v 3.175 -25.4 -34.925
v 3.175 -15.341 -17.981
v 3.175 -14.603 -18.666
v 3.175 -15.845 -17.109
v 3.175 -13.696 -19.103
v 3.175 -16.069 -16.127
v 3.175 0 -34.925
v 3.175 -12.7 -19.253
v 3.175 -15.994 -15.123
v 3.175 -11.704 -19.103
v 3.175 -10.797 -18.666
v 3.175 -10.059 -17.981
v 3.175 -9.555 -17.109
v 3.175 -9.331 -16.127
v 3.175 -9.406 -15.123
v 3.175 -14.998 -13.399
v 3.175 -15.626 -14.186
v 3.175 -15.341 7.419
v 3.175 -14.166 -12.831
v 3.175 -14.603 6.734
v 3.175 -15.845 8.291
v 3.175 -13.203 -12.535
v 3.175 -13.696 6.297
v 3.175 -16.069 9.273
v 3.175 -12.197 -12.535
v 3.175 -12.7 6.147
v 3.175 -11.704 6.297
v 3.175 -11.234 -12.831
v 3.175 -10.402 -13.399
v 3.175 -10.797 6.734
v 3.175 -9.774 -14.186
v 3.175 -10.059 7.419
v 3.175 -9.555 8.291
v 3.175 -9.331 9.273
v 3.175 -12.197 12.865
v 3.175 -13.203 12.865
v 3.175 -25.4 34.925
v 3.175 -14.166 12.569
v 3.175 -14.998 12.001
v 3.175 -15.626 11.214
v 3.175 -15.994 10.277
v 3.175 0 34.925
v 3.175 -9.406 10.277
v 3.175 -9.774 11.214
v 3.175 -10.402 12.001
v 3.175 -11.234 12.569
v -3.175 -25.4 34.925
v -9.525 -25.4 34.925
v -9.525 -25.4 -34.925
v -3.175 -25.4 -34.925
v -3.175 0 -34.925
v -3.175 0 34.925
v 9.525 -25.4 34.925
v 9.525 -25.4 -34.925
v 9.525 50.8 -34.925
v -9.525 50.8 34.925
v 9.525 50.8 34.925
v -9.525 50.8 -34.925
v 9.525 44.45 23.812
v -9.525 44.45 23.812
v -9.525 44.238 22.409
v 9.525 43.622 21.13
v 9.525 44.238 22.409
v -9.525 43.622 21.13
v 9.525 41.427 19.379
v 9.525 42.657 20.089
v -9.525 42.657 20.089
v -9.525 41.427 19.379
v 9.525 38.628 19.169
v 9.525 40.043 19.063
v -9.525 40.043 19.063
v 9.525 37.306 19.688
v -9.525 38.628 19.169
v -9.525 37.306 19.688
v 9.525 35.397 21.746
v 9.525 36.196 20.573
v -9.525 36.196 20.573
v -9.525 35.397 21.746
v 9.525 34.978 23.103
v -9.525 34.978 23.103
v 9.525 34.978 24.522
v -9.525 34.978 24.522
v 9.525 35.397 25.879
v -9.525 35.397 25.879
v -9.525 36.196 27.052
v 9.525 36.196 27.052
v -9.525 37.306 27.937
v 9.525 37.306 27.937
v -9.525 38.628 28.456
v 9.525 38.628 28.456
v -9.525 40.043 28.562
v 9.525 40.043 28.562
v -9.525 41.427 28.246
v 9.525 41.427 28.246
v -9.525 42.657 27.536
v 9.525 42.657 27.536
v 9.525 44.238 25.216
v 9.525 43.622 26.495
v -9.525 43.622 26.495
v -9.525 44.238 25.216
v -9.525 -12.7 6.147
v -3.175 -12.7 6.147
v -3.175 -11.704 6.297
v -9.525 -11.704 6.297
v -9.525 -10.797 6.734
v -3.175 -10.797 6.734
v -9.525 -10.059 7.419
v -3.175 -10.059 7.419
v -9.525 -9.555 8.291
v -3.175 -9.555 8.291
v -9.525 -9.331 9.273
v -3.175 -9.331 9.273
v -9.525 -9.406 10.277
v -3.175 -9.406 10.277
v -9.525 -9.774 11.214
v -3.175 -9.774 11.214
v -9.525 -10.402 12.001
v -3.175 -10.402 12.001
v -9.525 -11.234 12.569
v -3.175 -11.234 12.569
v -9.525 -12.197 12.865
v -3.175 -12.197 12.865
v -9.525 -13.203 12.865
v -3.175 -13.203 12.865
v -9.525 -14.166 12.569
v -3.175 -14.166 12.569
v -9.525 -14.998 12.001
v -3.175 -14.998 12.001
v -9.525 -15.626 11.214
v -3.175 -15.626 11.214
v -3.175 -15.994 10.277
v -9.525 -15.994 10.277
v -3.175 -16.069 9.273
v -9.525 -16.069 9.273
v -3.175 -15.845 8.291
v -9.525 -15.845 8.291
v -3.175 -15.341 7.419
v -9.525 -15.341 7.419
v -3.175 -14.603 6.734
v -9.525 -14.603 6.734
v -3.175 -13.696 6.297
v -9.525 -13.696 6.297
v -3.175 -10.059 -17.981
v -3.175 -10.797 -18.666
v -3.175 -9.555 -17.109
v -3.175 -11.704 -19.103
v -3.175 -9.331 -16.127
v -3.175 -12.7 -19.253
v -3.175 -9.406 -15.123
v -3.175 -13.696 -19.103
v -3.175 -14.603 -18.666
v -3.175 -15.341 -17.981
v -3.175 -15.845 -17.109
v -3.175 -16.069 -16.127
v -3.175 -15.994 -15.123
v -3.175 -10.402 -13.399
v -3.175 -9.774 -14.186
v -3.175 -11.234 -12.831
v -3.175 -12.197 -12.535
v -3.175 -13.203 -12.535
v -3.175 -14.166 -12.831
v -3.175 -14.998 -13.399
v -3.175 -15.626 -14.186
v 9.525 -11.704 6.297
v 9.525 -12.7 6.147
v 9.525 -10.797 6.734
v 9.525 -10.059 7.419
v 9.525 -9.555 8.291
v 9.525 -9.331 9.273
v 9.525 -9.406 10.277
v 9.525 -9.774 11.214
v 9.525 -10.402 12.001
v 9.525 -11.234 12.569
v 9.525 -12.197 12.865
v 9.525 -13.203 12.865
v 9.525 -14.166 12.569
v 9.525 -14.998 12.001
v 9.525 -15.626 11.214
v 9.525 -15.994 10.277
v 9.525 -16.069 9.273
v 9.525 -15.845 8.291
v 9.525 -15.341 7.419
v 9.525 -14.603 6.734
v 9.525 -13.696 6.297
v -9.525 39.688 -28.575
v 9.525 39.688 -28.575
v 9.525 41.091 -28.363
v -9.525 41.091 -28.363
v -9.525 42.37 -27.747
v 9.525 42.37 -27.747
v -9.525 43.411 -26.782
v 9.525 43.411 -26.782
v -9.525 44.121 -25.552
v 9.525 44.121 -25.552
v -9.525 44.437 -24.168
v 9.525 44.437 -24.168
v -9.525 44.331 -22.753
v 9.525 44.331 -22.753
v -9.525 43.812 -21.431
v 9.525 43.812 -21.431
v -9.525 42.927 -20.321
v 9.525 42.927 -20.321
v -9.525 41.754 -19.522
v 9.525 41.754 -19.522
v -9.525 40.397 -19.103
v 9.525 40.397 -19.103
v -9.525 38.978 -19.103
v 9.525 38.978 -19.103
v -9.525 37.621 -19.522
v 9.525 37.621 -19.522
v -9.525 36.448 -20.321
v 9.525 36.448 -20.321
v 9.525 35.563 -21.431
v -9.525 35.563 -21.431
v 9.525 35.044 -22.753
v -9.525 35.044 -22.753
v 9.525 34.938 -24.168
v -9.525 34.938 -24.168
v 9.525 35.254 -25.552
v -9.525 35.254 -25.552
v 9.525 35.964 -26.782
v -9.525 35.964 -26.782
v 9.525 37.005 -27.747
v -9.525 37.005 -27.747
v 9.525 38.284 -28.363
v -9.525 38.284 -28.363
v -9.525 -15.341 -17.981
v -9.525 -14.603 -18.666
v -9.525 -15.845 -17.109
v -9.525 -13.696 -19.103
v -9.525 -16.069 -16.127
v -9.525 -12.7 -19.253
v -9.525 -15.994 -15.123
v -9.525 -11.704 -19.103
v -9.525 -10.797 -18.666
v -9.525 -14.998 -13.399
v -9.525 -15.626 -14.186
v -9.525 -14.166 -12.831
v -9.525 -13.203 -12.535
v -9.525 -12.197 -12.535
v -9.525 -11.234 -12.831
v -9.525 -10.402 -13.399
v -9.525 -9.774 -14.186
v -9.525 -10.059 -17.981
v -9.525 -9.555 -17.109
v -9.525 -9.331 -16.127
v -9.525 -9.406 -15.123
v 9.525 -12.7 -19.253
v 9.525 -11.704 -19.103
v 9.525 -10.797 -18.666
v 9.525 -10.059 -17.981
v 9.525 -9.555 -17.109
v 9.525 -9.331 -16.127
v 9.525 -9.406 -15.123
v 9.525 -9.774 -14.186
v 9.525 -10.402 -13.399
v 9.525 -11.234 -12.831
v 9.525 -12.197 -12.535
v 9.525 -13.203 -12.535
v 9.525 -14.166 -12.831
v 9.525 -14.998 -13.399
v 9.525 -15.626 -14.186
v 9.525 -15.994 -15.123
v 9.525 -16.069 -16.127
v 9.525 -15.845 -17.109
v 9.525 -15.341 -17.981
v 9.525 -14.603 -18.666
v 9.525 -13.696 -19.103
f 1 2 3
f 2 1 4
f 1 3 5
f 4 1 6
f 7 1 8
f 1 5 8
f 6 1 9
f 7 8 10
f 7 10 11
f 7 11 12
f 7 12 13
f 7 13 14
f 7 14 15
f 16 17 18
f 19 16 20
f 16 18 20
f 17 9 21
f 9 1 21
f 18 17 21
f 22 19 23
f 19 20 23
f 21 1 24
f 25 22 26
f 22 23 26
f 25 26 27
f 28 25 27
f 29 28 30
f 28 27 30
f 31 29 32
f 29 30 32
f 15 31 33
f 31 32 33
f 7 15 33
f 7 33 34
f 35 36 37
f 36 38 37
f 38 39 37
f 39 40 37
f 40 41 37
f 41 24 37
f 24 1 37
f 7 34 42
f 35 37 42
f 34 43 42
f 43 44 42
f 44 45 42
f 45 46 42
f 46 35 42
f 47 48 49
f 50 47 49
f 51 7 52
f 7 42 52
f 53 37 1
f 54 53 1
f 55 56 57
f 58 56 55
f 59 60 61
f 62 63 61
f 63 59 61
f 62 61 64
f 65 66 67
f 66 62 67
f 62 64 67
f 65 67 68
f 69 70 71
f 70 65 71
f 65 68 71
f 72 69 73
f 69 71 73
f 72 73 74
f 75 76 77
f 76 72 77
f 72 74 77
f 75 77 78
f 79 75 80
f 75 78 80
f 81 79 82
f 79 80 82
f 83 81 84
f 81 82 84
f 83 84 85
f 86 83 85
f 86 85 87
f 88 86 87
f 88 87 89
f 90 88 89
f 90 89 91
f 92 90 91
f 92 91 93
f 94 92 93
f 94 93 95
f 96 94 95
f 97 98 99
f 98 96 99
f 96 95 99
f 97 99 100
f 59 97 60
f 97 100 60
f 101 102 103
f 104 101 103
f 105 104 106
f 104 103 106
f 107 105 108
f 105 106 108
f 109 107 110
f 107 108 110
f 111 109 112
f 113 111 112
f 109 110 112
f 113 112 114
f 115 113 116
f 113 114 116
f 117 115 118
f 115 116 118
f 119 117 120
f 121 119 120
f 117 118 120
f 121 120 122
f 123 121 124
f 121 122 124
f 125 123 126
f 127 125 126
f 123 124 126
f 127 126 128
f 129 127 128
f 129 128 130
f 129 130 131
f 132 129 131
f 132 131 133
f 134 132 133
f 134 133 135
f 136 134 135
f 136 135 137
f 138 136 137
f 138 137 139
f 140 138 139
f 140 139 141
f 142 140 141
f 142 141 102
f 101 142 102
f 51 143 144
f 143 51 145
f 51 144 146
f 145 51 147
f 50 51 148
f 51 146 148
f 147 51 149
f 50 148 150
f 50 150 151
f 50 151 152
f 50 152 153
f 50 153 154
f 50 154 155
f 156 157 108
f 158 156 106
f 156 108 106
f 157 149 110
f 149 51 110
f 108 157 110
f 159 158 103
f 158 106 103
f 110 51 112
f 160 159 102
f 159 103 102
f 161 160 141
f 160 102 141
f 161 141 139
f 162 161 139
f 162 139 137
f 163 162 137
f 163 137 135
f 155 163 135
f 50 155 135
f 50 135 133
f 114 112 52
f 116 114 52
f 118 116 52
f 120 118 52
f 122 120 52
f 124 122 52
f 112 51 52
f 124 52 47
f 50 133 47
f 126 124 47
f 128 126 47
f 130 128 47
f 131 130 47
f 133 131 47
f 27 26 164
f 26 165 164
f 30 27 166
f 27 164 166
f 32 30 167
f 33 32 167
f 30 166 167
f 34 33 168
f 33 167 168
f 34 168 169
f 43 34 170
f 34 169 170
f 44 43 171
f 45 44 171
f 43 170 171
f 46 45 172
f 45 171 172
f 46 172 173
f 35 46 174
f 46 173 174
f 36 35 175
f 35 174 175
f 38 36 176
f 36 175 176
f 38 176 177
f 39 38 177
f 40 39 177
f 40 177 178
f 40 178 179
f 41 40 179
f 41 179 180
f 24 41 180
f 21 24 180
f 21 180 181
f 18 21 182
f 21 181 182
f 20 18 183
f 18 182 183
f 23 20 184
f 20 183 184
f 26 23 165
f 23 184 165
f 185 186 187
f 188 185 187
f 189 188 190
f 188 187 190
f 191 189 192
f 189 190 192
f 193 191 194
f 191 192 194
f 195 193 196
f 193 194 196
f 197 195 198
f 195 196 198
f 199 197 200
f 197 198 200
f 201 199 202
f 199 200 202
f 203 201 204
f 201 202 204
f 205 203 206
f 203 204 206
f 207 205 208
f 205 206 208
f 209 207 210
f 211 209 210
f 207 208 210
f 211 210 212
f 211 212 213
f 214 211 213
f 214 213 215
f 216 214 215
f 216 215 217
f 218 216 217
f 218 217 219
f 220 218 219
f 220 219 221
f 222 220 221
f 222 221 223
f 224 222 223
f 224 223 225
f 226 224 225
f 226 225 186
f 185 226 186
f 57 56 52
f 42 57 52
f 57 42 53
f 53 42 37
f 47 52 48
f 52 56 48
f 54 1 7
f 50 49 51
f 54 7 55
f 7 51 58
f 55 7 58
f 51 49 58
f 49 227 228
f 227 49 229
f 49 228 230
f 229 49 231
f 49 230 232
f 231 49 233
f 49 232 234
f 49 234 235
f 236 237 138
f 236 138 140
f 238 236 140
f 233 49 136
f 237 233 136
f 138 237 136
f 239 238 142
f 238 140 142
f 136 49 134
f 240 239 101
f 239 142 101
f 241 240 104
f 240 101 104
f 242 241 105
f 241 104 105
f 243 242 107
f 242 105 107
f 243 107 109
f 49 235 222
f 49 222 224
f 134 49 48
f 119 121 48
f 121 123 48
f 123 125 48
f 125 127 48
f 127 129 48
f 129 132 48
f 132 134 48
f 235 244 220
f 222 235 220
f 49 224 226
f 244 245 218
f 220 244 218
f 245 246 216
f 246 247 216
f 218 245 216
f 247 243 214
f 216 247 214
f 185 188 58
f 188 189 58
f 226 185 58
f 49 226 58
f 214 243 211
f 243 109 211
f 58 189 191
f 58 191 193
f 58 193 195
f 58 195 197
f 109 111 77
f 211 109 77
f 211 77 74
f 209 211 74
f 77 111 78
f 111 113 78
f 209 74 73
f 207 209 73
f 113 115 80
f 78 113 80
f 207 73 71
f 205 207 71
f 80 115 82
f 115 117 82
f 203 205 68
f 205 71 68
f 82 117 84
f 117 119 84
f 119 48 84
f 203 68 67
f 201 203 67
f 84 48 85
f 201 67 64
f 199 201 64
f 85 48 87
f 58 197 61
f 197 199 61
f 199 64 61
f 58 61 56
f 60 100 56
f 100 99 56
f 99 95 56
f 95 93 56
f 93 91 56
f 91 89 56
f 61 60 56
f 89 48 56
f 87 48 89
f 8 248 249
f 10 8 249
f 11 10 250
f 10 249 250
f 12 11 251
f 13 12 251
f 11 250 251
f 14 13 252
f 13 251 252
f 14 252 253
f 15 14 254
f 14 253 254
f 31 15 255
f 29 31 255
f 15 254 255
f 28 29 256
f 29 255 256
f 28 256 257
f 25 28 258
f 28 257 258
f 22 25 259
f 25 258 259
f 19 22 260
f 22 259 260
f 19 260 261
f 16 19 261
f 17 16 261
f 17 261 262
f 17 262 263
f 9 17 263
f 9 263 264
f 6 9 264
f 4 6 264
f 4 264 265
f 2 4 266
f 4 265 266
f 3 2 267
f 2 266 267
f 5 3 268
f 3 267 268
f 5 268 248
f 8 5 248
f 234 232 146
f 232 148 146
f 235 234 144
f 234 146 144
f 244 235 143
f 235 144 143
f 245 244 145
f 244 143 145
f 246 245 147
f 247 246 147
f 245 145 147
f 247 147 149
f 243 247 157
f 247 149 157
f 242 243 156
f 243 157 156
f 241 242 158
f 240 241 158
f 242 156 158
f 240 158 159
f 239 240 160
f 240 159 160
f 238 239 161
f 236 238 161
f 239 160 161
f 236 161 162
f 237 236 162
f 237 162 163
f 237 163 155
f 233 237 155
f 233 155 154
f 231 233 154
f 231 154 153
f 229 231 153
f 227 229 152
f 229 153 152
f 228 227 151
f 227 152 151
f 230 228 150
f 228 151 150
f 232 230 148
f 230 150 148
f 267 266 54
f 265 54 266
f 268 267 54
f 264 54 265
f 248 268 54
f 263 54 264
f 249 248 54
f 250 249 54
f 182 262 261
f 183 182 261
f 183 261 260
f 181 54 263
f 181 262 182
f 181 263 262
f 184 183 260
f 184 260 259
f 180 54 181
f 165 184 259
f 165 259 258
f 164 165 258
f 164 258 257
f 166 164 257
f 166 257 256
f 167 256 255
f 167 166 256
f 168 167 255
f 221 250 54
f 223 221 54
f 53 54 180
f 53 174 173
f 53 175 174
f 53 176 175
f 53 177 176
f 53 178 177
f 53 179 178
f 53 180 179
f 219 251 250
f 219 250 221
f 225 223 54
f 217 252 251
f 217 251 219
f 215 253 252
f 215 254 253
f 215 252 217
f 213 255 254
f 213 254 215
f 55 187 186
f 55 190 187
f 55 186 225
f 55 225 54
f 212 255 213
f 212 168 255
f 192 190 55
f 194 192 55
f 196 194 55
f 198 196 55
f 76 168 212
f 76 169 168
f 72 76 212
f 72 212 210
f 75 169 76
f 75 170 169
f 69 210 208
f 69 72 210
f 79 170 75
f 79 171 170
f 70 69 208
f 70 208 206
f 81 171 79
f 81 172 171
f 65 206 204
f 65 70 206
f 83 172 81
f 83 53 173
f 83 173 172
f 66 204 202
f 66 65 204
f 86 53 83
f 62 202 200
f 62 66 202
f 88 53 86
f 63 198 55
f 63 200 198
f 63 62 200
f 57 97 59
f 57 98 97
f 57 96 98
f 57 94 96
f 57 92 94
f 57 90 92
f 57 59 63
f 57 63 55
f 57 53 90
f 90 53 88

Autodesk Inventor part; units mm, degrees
ref_plane "YZ Plane" through (0, 0, 0) normal (1, 0, 0) x (0, 1, 0)
ref_plane "XZ Plane" through (0, 0, 0) normal (0, 1, 0) x (-1, 0, 0)
ref_plane "XY Plane" through (0, 0, 0) normal (0, 0, 1) x (1, 0, 0)
sketch "Sketch4" plane through (0, 0, 0) normal (1, 0, 0) x (0, 1, 0)
  line L0 (-25.4, 34.925) -> (-25.4, -34.925)
  line L1 (-25.4, -34.925) -> (0, -34.925)
  line L2 (0, -34.925) -> (0, 34.925)
  line L3 (0, 34.925) -> (-25.4, 34.925)
  line L4 (-25.4, -34.925) -> (-12.7, 0) construction
  line L5 (0, 34.925) -> (50.8, 34.925)
  line L6 (50.8, 34.925) -> (50.8, -34.925)
  line L7 (50.8, -34.925) -> (0, -34.925)
  line L8 (0, -34.925) -> (0, 34.925)
  circle A0 centre (39.6875, 23.8125) radius 4.7625
  circle A1 centre (39.6875, -23.8125) radius 4.7625
  point P0 (0, 0)
  point P1 (-12.7, 0)
  dimension "d2" = 69.85
  dimension "d3" = 25.4
  dimension "d12" = 50.8
  dimension "d15" = 9.525
  dimension "d16" = 11.1125
  dimension "d23" = 11.1125
  dimension "d26" = 11.1125
extrude "Extrusion3" add sketch "Sketch4" along normal mid plane 19.05 contours L3 L2 L1 L0 | L5 L6 L7 L2 | A1
sketch "Sketch6" plane through (-9.525, -25.4, 34.925) normal (0, 0, 1) x (1, 0, 0)
  line L0 (9.525, 25.4) -> (9.525, 0) construction
  line L1 (0, 0) -> (19.05, 0) construction
  line L2 (6.35, 0) -> (12.7, 0)
  line L3 (12.7, 0) -> (12.7, 25.4)
  line L4 (12.7, 25.4) -> (6.35, 25.4)
  line L5 (6.35, 25.4) -> (6.35, 0)
  line L6 (6.35, 0) -> (12.7, 25.4) construction
  line L7 (12.7, 0) -> (6.35, 25.4) construction
  point P0 (9.525, 12.7)
  dimension "d20" = 6.35
extrude "Extrusion4" cut sketch "Sketch6" against normal through all
sketch "Sketch7" plane through (9.525, 0, 0) normal (1, 0, 0) x (0, 0, -1)
  line L0 (34.925, -25.4) -> (34.925, 0) projected
  line L1 (-34.925, -25.4) -> (34.925, -25.4) projected
  line L2 (-34.925, 0) -> (-34.925, -25.4) projected
  line L3 (-34.925, 0) -> (34.925, 0) projected
  line L4 (-34.925, -85.725) -> (-34.925, -12.7) projected
  arc A0 (-34.925, -85.725) -> (-22.225, -98.425) centre (-22.225, -85.725) ccw projected
  line L5 (479.425, -98.425) -> (-22.225, -98.425) projected
  arc A1 (479.425, -98.425) -> (492.125, -85.725) centre (479.425, -85.725) ccw projected
  line L6 (492.125, -81.1401) -> (492.125, -85.725) projected
  arc A2 (492.125, -81.1401) -> (488.7869, -72.5584) centre (479.425, -81.1401) ccw projected
  line L7 (488.7869, -72.5584) -> (426.0501, -4.1183) projected
  arc A3 (426.0501, -4.1183) -> (416.6882, 0) centre (416.6882, -12.7) ccw projected
  line L8 (416.6882, 0) -> (-22.225, 0) projected
  arc A4 (-22.225, 0) -> (-34.925, -12.7) centre (-22.225, -12.7) ccw projected
  circle A5 centre (473.075, -79.375) radius 4.826 projected
  circle A6 centre (15.875, -79.375) radius 4.826 projected
  circle A7 centre (457.2, -79.375) radius 4.826 projected
  circle A8 centre (440.1745, -40.6685) radius 3.3782 projected
  circle A9 centre (422.275, -85.725) radius 3.3782 projected
  line L9 (20.6375, -55.8157) -> (20.6375, -25.4) projected
  arc A10 (23.8125, -22.225) -> (20.6375, -25.4) centre (23.8125, -25.4) ccw projected
  line L10 (23.8125, -22.225) -> (46.9319, -22.225) projected
  arc A11 (49.4596, -27.3213) -> (46.9319, -22.225) centre (46.9319, -25.4) ccw projected
  line L11 (49.4596, -27.3213) -> (26.3402, -57.737) projected
  arc A12 (20.6375, -55.8157) -> (26.3402, -57.737) centre (23.8125, -55.8157) ccw projected
  line L12 (28.1443, -71.1037) -> (56.0904, -34.338) projected
  arc A13 (61.7931, -36.2593) -> (56.0904, -34.338) centre (58.6181, -36.2593) ccw projected
  line L13 (61.7931, -36.2593) -> (61.7931, -73.025) projected
  arc A14 (58.6181, -76.2) -> (61.7931, -73.025) centre (58.6181, -73.025) ccw projected
  line L14 (58.6181, -76.2) -> (30.672, -76.2) projected
  arc A15 (28.1443, -71.1037) -> (30.672, -76.2) centre (30.672, -73.025) ccw projected
  line L15 (184.056, -73.025) -> (184.056, -34.8804) projected
  arc A16 (189.5742, -32.738) -> (184.056, -34.8804) centre (187.231, -34.8804) ccw projected
  line L16 (189.5742, -32.738) -> (224.451, -70.8826) projected
  arc A17 (222.1078, -76.2) -> (224.451, -70.8826) centre (222.1078, -73.025) ccw projected
  line L17 (222.1078, -76.2) -> (187.231, -76.2) projected
  arc A18 (184.056, -73.025) -> (187.231, -76.2) centre (187.231, -73.025) ccw projected
  line L18 (291.2199, -27.5424) -> (254.7557, -67.4233) projected
  arc A19 (249.2375, -65.2808) -> (254.7557, -67.4233) centre (252.4125, -65.2808) ccw projected
  line L19 (249.2375, -65.2808) -> (249.2375, -25.4) projected
  arc A20 (252.4125, -22.225) -> (249.2375, -25.4) centre (252.4125, -25.4) ccw projected
  line L20 (252.4125, -22.225) -> (288.8767, -22.225) projected
  arc A21 (291.2199, -27.5424) -> (288.8767, -22.225) centre (288.8767, -25.4) ccw projected
  line L21 (234.1943, -67.4233) -> (197.7301, -27.5424) projected
  arc A22 (200.0733, -22.225) -> (197.7301, -27.5424) centre (200.0733, -25.4) ccw projected
  line L22 (200.0733, -22.225) -> (236.5375, -22.225) projected
  arc A23 (239.7125, -25.4) -> (236.5375, -22.225) centre (236.5375, -25.4) ccw projected
  line L23 (239.7125, -25.4) -> (239.7125, -65.2808) projected
  arc A24 (234.1943, -67.4233) -> (239.7125, -65.2808) centre (236.5375, -65.2808) ccw projected
  line L24 (304.894, -34.8804) -> (304.894, -73.025) projected
  arc A25 (301.719, -76.2) -> (304.894, -73.025) centre (301.719, -73.025) ccw projected
  line L25 (301.719, -76.2) -> (266.8422, -76.2) projected
  arc A26 (264.499, -70.8826) -> (266.8422, -76.2) centre (266.8422, -73.025) ccw projected
  line L26 (264.499, -70.8826) -> (299.3758, -32.738) projected
  arc A27 (304.894, -34.8804) -> (299.3758, -32.738) centre (301.719, -34.8804) ccw projected
  line L27 (341.3125, -25.4) -> (341.3125, -73.025) projected
  arc A28 (338.1375, -76.2) -> (341.3125, -73.025) centre (338.1375, -73.025) ccw projected
  line L28 (338.1375, -76.2) -> (317.594, -76.2) projected
  arc A29 (314.419, -73.025) -> (317.594, -76.2) centre (317.594, -73.025) ccw projected
  line L29 (314.419, -73.025) -> (314.419, -25.4) projected
  arc A30 (317.594, -22.225) -> (314.419, -25.4) centre (317.594, -25.4) ccw projected
  line L30 (317.594, -22.225) -> (338.1375, -22.225) projected
  arc A31 (341.3125, -25.4) -> (338.1375, -22.225) centre (338.1375, -25.4) ccw projected
  line L31 (400.05, -69.85) -> (400.05, -29.1831) projected
  arc A32 (405.5794, -27.053) -> (400.05, -29.1831) centre (403.225, -29.1831) ccw projected
  line L32 (405.5794, -27.053) -> (445.2458, -70.8949) projected
  arc A33 (442.8915, -76.2) -> (445.2458, -70.8949) centre (442.8915, -73.025) ccw projected
  line L33 (442.8915, -76.2) -> (406.4, -76.2) projected
  arc A34 (400.05, -69.85) -> (406.4, -76.2) centre (406.4, -69.85) ccw projected
  circle A35 centre (83.3958, -57.6072) radius 5.5626 projected
  circle A36 centre (160.8658, -32.2072) radius 5.5626 projected
  circle A37 centre (83.3958, -32.2072) radius 5.5626 projected
  circle A38 centre (160.8658, -57.6072) radius 5.5626 projected
  circle A39 centre (358.775, -28.575) radius 2.5527 projected
  circle A40 centre (368.3, -19.05) radius 2.5527 projected
  circle A41 centre (377.825, -9.525) radius 2.5527 projected
  circle A42 centre (358.775, -88.9) radius 2.5527 projected
  circle A43 centre (377.825, -69.85) radius 2.5527 projected
  circle A44 centre (368.3, -79.375) radius 2.5527 projected
  circle A45 centre (-9.525, -12.7) radius 3.3782 projected
  circle A46 centre (-9.525, -85.725) radius 3.3782 projected
  circle A47 centre (15.875, -12.7) radius 3.3782 projected
  circle A48 centre (41.275, -12.7) radius 3.3782 projected
  circle A49 centre (41.275, -85.725) radius 3.3782 projected
  circle A50 centre (66.675, -12.7) radius 3.3782 projected
  circle A51 centre (92.075, -12.7) radius 3.3782 projected
  circle A52 centre (92.075, -85.725) radius 3.3782 projected
  circle A53 centre (117.475, -12.7) radius 3.3782 projected
  circle A54 centre (117.475, -85.725) radius 3.3782 projected
  circle A55 centre (142.875, -12.7) radius 3.3782 projected
  circle A56 centre (142.875, -85.725) radius 3.3782 projected
  circle A57 centre (168.275, -12.7) radius 3.3782 projected
  circle A58 centre (193.675, -12.7) radius 3.3782 projected
  circle A59 centre (193.675, -85.725) radius 3.3782 projected
  circle A60 centre (219.075, -12.7) radius 3.3782 projected
  circle A61 centre (219.075, -85.725) radius 3.3782 projected
  circle A62 centre (244.475, -12.7) radius 3.3782 projected
  circle A63 centre (269.875, -12.7) radius 3.3782 projected
  circle A64 centre (269.875, -85.725) radius 3.3782 projected
  circle A65 centre (295.275, -12.7) radius 3.3782 projected
  circle A66 centre (295.275, -85.725) radius 3.3782 projected
  circle A67 centre (320.675, -12.7) radius 3.3782 projected
  circle A68 centre (320.675, -85.725) radius 3.3782 projected
  circle A69 centre (346.075, -12.7) radius 3.3782 projected
  circle A70 centre (346.075, -85.725) radius 3.3782 projected
  circle A71 centre (396.875, -12.7) radius 3.3782 projected
  circle A72 centre (396.875, -85.725) radius 3.3782 projected
  circle A73 centre (419.1, -15.875) radius 4.953 projected
  circle A74 centre (66.5556, -90.5002) radius 3.3528 projected
  circle A75 centre (177.706, -90.5002) radius 3.3528 projected
  circle A76 centre (122.1308, -60.325) radius 14.2812 projected
  circle A77 centre (244.475, -83.185) radius 4.826 projected
  circle A78 centre (-9.525, -12.7) radius 3.3782
  circle A79 centre (15.875, -12.7) radius 3.3782
  point P0 (0, 0)
extrude "Extrusion5" cut sketch "Sketch7" against normal through all contours A45 | A47
sketch "Sketch8" plane through (9.525, 0, 0) normal (1, 0, 0) x (0, 0, -1)
  circle A0 centre (-23.8125, 39.6875) radius 4.7625 projected
  circle A1 centre (23.8125, 39.6875) radius 4.7625
  line L0 (34.925, -25.4) -> (34.925, 50.8) projected
  point P0 (0, 0)
  dimension "d27" = 11.1125
extrude "Extrusion6" cut sketch "Sketch8" against normal through all contours A1
properties part number "NarrowSupportForLift" material "Aluminum 6061"
